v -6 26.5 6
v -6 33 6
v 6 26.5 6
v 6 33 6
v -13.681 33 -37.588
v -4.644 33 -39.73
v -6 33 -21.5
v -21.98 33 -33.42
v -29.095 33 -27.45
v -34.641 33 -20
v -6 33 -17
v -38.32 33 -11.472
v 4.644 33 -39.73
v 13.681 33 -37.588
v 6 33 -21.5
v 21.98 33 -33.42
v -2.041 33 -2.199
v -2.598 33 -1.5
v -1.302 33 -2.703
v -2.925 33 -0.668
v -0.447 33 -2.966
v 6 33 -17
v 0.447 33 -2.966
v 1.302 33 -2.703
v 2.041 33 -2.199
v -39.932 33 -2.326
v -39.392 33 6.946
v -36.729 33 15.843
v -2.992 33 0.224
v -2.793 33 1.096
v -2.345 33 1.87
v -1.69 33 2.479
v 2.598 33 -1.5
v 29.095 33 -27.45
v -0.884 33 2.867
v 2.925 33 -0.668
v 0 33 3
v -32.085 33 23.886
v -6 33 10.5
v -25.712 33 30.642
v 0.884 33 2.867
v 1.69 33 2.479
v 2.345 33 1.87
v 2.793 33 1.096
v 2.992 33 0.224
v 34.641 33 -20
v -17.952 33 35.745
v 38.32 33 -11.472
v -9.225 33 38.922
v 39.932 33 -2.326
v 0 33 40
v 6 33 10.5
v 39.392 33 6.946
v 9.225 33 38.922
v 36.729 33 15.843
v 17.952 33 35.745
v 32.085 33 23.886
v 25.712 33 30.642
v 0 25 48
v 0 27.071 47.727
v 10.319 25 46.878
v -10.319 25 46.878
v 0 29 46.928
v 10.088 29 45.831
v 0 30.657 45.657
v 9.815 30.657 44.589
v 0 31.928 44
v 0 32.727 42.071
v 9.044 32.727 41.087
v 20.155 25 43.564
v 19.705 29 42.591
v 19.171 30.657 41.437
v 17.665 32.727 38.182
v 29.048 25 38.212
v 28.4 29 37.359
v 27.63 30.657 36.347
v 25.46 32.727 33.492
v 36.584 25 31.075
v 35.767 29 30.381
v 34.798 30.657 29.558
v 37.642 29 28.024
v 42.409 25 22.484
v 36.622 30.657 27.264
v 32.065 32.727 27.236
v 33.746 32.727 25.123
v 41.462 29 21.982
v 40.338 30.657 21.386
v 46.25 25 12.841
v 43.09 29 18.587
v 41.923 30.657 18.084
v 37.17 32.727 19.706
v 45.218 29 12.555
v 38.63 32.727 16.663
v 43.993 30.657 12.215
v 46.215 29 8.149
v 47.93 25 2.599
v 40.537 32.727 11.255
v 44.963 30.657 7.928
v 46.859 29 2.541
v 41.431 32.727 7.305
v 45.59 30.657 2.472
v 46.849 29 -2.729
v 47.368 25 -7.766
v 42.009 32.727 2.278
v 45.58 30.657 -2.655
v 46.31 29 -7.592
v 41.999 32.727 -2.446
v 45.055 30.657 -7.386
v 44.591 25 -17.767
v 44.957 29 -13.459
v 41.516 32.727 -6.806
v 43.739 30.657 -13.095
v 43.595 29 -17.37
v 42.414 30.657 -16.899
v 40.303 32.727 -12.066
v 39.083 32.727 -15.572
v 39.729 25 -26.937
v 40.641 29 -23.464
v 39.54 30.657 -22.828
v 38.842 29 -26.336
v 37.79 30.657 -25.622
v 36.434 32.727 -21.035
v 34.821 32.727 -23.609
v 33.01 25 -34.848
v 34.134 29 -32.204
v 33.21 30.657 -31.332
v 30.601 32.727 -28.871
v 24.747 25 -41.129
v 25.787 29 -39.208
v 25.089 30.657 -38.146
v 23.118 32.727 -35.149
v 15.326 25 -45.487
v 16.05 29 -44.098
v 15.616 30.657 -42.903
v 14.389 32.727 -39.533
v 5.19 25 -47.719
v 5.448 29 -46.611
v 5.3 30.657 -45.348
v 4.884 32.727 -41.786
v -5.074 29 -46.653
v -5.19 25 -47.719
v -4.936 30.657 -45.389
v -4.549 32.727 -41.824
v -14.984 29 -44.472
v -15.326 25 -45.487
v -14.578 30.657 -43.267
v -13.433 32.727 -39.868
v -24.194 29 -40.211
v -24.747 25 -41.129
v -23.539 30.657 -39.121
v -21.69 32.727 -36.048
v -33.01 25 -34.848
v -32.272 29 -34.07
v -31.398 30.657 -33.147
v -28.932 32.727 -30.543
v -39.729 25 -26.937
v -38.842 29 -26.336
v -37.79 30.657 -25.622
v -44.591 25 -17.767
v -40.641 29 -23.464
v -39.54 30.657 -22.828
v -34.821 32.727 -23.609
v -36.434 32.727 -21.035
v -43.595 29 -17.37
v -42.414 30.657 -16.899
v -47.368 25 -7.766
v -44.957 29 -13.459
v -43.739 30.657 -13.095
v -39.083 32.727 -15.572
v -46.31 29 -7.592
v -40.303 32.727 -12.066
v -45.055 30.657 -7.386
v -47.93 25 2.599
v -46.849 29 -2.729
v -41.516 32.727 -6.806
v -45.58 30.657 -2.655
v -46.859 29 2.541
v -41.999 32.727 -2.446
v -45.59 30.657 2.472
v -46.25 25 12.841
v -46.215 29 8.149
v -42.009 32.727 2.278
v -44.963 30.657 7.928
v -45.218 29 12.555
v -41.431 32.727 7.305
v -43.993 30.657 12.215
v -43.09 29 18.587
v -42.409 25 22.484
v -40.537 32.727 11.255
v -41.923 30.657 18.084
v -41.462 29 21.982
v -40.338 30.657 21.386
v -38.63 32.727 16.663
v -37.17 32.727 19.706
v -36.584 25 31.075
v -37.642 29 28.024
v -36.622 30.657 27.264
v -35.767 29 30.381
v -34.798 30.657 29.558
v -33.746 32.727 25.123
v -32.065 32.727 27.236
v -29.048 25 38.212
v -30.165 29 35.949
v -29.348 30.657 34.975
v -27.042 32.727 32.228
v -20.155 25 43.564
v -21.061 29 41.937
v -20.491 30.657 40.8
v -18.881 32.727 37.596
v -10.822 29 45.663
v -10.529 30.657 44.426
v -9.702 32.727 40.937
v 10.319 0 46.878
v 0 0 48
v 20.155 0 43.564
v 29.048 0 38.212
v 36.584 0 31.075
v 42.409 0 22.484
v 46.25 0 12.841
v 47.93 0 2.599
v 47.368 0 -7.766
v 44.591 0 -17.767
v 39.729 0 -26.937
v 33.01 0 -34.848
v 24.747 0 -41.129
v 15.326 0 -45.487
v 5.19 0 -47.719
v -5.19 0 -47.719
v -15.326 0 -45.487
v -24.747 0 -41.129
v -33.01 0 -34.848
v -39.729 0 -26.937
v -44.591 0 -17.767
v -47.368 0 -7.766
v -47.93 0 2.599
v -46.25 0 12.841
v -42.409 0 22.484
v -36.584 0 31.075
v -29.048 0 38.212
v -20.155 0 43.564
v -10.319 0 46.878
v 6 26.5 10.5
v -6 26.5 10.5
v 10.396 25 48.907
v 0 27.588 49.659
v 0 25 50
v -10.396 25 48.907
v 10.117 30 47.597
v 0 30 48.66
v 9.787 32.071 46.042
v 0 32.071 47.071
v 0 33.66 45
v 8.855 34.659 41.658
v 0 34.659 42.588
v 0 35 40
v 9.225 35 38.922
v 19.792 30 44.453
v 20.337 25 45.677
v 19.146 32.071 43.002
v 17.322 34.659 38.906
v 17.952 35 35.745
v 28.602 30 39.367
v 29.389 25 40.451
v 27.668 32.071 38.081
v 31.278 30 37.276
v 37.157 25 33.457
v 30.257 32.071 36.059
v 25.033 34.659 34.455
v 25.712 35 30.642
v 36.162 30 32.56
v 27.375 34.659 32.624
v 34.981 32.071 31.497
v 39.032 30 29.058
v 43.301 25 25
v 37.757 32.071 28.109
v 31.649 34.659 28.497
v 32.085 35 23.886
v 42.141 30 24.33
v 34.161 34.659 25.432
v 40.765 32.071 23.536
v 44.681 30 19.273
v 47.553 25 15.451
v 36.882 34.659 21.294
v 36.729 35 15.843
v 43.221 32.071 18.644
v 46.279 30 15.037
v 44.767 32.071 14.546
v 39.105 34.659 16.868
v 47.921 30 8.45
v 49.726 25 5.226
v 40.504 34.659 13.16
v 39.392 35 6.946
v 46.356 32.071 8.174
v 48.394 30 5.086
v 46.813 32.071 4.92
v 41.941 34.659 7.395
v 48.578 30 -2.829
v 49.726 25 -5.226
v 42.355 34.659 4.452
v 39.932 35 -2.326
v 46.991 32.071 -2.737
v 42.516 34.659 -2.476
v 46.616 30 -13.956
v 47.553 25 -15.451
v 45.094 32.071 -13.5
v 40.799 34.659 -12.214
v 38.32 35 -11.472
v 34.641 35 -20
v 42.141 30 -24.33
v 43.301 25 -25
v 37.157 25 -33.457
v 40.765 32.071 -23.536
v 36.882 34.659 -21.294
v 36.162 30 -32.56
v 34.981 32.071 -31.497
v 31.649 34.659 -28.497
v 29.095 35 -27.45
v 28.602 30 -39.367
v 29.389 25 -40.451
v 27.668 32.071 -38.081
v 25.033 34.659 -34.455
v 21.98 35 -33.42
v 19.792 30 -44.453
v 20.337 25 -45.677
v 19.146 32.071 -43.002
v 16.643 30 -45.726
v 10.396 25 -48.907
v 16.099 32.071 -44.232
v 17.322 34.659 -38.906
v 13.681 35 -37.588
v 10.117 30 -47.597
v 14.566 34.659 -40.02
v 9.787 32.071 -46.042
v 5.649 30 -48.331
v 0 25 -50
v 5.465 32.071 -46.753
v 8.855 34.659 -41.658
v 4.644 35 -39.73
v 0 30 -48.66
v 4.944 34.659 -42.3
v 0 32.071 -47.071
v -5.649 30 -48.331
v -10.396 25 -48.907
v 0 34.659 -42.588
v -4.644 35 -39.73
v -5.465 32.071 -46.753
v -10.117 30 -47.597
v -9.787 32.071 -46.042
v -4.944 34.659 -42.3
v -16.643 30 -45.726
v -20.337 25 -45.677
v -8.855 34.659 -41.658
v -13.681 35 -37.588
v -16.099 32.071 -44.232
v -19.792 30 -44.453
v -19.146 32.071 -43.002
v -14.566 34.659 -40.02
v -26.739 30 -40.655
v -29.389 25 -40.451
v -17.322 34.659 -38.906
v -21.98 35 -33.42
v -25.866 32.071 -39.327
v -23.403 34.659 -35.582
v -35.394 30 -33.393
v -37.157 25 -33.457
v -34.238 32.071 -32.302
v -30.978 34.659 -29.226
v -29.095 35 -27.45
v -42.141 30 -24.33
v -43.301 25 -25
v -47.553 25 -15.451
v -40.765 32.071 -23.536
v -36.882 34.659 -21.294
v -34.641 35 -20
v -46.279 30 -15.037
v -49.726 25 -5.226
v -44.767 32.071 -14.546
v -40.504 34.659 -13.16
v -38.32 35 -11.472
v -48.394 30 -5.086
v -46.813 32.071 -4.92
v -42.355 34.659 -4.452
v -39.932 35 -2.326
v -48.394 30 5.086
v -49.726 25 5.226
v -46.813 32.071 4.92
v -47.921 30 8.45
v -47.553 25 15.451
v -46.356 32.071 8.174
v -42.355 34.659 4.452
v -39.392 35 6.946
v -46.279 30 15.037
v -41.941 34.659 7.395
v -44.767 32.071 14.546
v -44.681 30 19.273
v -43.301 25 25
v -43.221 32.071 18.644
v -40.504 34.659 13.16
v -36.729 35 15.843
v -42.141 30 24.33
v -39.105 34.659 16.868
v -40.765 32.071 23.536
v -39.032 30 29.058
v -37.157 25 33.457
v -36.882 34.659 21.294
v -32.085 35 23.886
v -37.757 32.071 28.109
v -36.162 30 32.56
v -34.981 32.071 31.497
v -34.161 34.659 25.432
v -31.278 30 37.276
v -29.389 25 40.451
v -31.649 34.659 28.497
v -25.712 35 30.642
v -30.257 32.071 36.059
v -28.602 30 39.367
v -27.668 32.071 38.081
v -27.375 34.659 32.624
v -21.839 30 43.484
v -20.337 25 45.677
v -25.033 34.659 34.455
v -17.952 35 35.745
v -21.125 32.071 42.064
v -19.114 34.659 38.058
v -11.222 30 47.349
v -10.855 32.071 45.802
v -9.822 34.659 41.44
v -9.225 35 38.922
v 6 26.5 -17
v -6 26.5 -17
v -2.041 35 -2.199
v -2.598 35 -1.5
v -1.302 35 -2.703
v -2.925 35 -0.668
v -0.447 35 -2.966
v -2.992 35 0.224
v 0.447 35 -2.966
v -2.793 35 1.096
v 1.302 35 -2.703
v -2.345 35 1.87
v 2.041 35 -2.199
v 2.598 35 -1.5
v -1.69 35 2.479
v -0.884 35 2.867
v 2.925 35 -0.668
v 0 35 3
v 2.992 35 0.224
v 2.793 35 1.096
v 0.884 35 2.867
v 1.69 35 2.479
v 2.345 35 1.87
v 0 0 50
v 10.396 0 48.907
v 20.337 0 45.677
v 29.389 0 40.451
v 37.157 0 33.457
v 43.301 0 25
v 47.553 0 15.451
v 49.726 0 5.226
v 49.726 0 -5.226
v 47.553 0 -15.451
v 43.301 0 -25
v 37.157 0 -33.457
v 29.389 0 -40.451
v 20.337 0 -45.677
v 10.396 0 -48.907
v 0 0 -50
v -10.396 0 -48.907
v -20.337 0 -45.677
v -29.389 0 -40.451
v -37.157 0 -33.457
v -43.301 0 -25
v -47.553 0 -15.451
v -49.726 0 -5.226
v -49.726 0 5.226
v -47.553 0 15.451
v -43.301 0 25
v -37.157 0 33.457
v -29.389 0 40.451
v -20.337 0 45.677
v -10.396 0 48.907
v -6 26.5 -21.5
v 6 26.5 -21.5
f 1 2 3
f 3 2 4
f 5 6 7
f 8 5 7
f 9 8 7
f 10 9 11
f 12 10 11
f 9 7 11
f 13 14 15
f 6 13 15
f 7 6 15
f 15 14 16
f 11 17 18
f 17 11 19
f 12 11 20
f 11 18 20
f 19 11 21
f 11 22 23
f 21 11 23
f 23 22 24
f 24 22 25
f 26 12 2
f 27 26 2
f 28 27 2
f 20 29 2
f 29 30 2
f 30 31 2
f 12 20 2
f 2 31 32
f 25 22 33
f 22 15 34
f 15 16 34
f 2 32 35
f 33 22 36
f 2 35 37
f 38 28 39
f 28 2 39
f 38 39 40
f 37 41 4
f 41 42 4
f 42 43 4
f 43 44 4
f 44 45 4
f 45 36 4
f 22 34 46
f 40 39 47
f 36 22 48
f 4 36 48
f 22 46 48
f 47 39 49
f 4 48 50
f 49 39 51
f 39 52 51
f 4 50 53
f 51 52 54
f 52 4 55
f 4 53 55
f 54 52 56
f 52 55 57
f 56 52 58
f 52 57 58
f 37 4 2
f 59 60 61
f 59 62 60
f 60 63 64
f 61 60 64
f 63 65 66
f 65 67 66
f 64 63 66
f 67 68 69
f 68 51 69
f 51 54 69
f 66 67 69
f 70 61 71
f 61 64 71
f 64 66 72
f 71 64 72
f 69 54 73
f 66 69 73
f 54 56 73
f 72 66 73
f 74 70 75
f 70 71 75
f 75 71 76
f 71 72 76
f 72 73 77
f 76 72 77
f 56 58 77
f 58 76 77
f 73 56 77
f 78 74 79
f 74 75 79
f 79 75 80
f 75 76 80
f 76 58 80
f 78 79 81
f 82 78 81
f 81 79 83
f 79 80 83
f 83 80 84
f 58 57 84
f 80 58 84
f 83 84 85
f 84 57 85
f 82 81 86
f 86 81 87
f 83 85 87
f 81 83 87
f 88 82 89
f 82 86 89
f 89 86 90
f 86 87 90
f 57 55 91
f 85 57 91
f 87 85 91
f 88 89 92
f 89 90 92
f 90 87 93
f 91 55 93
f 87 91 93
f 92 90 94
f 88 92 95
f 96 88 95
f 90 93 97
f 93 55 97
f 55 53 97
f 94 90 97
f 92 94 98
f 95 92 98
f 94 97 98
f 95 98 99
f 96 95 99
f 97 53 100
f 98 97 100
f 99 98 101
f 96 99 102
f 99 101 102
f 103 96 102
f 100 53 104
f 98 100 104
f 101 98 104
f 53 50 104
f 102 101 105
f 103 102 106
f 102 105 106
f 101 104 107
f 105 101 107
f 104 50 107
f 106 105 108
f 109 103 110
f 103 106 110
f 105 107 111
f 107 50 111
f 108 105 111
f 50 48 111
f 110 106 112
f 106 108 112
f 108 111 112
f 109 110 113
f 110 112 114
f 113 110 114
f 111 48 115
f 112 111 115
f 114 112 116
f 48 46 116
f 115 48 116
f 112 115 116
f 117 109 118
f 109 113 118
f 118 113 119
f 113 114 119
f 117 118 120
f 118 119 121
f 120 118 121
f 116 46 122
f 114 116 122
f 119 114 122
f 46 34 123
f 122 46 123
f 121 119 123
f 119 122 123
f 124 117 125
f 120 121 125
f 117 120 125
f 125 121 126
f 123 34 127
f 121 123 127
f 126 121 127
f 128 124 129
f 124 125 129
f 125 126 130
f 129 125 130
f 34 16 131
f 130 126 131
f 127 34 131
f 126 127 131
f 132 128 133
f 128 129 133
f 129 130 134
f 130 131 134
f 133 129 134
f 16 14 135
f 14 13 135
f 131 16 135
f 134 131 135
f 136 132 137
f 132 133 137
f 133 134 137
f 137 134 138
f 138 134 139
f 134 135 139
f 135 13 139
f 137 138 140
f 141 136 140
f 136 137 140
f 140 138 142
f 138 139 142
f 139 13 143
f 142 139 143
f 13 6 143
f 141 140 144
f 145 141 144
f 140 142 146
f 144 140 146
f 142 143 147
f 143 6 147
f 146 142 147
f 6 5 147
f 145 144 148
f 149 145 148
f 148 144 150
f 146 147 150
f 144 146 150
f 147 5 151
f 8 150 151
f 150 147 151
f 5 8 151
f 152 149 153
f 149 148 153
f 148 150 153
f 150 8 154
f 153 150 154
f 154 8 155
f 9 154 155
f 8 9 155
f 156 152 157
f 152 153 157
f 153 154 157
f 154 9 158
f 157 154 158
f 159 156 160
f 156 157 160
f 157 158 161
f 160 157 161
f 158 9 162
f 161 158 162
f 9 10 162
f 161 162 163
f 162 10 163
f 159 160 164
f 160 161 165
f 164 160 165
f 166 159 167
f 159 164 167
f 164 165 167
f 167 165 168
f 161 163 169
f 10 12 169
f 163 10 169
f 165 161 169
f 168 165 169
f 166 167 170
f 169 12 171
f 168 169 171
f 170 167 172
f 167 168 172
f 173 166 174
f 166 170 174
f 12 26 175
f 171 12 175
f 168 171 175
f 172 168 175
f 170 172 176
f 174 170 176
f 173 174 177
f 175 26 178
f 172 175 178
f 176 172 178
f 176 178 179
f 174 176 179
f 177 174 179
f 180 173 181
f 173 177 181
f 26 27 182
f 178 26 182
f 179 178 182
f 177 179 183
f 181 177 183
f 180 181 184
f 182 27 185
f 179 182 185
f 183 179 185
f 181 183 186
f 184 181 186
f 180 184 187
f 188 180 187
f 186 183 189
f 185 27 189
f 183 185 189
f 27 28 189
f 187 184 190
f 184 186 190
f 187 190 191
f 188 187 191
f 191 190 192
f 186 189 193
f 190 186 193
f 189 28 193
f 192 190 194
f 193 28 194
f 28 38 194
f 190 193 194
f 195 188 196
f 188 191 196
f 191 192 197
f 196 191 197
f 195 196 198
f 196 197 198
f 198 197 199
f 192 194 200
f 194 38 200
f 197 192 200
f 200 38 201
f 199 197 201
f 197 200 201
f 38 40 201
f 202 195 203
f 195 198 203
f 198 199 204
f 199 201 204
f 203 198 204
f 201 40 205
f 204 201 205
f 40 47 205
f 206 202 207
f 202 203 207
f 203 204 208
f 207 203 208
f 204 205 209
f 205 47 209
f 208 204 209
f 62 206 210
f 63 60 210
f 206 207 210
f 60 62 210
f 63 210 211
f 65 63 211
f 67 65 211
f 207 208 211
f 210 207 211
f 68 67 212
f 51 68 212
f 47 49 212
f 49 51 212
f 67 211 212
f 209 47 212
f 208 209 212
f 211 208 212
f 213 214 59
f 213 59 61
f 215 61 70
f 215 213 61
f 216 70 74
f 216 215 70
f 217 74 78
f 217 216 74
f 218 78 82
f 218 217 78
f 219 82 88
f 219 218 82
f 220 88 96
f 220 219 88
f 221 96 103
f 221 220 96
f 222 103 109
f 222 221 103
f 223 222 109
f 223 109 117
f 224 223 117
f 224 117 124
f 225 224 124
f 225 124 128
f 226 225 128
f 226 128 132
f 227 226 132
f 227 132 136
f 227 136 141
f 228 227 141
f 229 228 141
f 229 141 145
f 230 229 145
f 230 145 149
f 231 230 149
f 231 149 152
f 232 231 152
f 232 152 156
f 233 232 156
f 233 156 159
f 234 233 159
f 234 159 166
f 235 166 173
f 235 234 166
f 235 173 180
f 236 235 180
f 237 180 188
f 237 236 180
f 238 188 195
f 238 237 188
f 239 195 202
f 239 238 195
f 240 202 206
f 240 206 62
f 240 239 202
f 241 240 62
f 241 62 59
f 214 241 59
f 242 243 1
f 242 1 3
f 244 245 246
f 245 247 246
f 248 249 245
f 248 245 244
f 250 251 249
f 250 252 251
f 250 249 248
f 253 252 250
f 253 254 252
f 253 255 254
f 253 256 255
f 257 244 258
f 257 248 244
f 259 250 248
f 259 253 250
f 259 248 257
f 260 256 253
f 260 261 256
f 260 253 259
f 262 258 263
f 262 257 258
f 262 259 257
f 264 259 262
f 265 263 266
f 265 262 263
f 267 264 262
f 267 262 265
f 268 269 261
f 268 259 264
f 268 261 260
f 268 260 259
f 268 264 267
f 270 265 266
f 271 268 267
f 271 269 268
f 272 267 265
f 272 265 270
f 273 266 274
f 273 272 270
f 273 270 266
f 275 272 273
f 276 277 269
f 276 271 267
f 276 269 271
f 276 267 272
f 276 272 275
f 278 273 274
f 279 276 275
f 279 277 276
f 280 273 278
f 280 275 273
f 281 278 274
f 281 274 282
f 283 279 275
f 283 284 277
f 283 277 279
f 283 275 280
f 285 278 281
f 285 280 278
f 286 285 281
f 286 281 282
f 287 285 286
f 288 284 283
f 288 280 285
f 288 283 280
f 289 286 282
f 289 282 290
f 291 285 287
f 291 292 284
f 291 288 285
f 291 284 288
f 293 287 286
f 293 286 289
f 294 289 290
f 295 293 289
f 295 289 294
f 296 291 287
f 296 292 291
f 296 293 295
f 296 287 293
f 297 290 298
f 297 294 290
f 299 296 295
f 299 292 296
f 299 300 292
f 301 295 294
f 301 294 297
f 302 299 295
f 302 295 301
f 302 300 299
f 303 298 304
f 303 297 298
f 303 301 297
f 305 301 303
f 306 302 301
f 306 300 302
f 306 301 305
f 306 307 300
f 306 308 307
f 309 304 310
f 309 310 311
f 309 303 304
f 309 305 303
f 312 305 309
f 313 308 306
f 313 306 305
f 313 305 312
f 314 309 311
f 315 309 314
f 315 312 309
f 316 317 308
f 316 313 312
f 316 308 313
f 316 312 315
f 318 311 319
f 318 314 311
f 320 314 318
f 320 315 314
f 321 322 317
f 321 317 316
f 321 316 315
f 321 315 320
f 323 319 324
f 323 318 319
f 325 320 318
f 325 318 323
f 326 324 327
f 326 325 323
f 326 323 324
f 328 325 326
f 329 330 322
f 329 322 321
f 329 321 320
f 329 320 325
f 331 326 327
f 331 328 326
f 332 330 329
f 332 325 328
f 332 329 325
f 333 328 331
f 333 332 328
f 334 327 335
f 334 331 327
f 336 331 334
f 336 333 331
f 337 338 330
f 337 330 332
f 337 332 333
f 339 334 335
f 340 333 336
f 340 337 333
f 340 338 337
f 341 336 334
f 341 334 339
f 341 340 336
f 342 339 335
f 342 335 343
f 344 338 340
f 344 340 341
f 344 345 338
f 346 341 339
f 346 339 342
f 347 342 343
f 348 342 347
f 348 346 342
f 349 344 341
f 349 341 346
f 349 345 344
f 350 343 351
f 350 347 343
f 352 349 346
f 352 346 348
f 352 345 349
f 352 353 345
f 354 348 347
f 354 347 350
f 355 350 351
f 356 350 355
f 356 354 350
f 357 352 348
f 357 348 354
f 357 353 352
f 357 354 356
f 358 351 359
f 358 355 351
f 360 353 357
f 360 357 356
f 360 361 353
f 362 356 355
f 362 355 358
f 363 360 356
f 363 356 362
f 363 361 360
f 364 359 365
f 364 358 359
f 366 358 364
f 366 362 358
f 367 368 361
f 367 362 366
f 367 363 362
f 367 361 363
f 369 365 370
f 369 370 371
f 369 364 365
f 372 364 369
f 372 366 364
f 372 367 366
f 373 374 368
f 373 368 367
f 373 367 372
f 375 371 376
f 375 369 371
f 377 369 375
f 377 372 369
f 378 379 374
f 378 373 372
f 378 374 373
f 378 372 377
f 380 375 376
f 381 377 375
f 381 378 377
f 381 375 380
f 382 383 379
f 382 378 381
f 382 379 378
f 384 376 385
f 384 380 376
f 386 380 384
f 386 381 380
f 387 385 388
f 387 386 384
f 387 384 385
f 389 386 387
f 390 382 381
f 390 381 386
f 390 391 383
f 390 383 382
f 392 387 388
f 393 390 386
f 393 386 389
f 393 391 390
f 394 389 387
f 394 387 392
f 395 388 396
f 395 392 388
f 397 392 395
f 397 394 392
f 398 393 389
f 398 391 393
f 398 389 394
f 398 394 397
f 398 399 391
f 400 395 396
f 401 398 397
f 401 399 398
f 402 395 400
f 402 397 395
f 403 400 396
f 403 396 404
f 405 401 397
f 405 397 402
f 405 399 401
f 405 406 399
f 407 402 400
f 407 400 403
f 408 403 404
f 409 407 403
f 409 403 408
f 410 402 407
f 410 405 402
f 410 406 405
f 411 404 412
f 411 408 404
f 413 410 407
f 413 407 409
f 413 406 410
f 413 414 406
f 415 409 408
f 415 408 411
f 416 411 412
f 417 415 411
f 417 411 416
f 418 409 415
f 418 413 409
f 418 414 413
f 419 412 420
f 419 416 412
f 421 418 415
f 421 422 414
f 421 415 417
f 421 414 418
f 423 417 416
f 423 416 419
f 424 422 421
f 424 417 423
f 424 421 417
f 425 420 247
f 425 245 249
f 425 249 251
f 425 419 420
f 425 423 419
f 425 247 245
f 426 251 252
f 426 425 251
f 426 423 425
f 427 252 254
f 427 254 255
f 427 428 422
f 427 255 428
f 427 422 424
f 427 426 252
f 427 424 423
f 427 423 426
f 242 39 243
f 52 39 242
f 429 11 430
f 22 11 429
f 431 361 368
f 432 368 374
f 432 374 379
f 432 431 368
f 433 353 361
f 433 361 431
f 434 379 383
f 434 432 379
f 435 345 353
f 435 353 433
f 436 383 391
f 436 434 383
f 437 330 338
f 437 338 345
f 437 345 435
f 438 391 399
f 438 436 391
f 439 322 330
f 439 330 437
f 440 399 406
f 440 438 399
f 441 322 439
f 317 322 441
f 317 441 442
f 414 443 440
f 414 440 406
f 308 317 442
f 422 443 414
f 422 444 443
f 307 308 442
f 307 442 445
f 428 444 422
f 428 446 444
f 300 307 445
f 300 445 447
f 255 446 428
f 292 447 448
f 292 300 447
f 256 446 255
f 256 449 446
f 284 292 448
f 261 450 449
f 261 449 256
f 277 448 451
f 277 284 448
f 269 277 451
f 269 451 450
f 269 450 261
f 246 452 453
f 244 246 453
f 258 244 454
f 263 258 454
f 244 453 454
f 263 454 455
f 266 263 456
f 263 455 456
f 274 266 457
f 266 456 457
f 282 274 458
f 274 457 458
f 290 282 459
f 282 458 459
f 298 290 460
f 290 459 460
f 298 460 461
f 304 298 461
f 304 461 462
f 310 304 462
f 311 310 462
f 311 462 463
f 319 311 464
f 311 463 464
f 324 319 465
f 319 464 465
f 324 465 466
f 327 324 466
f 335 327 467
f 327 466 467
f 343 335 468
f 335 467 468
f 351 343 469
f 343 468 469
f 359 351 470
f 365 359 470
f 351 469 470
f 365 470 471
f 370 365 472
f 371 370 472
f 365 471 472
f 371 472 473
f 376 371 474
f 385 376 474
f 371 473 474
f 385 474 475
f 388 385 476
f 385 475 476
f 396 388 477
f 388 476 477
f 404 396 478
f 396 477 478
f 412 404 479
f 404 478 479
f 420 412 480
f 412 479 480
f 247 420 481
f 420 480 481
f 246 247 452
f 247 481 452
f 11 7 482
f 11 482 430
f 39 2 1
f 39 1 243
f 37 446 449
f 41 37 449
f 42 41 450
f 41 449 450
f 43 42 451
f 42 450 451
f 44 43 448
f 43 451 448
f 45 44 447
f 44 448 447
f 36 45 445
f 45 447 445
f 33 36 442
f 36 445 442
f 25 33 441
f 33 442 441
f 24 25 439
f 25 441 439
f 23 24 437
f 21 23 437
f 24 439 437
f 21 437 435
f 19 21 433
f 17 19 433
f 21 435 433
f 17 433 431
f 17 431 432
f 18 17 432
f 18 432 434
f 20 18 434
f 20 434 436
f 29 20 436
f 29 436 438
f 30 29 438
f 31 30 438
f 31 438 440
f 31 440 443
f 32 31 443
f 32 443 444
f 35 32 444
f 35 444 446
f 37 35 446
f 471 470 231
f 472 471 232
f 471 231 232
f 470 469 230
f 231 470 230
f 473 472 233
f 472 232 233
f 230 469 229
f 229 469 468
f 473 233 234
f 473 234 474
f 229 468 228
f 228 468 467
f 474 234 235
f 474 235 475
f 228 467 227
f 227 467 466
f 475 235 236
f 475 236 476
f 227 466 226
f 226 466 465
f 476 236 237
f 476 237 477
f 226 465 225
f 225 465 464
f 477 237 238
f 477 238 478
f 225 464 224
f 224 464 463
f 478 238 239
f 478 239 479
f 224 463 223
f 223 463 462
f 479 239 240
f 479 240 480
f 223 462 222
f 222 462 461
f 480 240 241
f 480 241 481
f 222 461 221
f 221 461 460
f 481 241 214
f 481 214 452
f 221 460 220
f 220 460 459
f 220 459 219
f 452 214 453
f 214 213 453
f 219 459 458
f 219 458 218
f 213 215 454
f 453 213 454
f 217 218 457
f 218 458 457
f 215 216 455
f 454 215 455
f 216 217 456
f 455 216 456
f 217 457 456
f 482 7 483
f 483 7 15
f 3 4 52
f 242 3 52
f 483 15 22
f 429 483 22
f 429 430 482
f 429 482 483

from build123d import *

# Parameters (mm, degrees)
SKETCH1_R           = 50
BOSS_EXTRUDE1_DEPTH = 35
FILLET1_R           = 10
SHELL1_T            = -2
SKETCH2_W           = 12
SKETCH2_H           = 4.5
BOSS_EXTRUDE2_DEPTH = 6.5
SKETCH3_R           = 3
CUT_EXTRUDE1_DEPTH  = 6.5


with BuildPart() as part:
    # Sketch1 → Boss-Extrude1 (new body)
    with BuildSketch(Plane(origin=(0, 0, 0), x_dir=(1, 0, 0), z_dir=(0, 1, 0))):
        with Locations(Location((0, 0, 0), (0, 0, 270))):
            Circle(SKETCH1_R)
    extrude(amount=BOSS_EXTRUDE1_DEPTH)

    # Fillet1
    fillet1_edges = [part.edges().sort_by_distance(p)[0] for p in [
        (0, 35, -50),
    ]]
    fillet(fillet1_edges, radius=FILLET1_R)

    # Shell1
    shell1_openings = [part.faces().sort_by_distance(p)[0] for p in [
        (0, 0, 0),
    ]]
    offset(amount=SHELL1_T, openings=shell1_openings, kind=Kind.INTERSECTION)

    # Sketch2 → Boss-Extrude2 (add)
    with BuildSketch(Plane.XZ.offset(-33)):
        with Locations((0, 8.25)):
            Rectangle(SKETCH2_W, SKETCH2_H)
        with Locations((0, -19.25)):
            Rectangle(SKETCH2_W, SKETCH2_H)
    extrude(amount=BOSS_EXTRUDE2_DEPTH)

    # Sketch3 → Cut-Extrude1 (cut)
    with BuildSketch(Plane(origin=(0, 35, 0), x_dir=(1, 0, 0), z_dir=(0, 1, 0))):
        with Locations(Location((0, 0, 0), (0, 0, 270))):
            Circle(SKETCH3_R)
    extrude(amount=-CUT_EXTRUDE1_DEPTH, mode=Mode.SUBTRACT)


solid = part.part
